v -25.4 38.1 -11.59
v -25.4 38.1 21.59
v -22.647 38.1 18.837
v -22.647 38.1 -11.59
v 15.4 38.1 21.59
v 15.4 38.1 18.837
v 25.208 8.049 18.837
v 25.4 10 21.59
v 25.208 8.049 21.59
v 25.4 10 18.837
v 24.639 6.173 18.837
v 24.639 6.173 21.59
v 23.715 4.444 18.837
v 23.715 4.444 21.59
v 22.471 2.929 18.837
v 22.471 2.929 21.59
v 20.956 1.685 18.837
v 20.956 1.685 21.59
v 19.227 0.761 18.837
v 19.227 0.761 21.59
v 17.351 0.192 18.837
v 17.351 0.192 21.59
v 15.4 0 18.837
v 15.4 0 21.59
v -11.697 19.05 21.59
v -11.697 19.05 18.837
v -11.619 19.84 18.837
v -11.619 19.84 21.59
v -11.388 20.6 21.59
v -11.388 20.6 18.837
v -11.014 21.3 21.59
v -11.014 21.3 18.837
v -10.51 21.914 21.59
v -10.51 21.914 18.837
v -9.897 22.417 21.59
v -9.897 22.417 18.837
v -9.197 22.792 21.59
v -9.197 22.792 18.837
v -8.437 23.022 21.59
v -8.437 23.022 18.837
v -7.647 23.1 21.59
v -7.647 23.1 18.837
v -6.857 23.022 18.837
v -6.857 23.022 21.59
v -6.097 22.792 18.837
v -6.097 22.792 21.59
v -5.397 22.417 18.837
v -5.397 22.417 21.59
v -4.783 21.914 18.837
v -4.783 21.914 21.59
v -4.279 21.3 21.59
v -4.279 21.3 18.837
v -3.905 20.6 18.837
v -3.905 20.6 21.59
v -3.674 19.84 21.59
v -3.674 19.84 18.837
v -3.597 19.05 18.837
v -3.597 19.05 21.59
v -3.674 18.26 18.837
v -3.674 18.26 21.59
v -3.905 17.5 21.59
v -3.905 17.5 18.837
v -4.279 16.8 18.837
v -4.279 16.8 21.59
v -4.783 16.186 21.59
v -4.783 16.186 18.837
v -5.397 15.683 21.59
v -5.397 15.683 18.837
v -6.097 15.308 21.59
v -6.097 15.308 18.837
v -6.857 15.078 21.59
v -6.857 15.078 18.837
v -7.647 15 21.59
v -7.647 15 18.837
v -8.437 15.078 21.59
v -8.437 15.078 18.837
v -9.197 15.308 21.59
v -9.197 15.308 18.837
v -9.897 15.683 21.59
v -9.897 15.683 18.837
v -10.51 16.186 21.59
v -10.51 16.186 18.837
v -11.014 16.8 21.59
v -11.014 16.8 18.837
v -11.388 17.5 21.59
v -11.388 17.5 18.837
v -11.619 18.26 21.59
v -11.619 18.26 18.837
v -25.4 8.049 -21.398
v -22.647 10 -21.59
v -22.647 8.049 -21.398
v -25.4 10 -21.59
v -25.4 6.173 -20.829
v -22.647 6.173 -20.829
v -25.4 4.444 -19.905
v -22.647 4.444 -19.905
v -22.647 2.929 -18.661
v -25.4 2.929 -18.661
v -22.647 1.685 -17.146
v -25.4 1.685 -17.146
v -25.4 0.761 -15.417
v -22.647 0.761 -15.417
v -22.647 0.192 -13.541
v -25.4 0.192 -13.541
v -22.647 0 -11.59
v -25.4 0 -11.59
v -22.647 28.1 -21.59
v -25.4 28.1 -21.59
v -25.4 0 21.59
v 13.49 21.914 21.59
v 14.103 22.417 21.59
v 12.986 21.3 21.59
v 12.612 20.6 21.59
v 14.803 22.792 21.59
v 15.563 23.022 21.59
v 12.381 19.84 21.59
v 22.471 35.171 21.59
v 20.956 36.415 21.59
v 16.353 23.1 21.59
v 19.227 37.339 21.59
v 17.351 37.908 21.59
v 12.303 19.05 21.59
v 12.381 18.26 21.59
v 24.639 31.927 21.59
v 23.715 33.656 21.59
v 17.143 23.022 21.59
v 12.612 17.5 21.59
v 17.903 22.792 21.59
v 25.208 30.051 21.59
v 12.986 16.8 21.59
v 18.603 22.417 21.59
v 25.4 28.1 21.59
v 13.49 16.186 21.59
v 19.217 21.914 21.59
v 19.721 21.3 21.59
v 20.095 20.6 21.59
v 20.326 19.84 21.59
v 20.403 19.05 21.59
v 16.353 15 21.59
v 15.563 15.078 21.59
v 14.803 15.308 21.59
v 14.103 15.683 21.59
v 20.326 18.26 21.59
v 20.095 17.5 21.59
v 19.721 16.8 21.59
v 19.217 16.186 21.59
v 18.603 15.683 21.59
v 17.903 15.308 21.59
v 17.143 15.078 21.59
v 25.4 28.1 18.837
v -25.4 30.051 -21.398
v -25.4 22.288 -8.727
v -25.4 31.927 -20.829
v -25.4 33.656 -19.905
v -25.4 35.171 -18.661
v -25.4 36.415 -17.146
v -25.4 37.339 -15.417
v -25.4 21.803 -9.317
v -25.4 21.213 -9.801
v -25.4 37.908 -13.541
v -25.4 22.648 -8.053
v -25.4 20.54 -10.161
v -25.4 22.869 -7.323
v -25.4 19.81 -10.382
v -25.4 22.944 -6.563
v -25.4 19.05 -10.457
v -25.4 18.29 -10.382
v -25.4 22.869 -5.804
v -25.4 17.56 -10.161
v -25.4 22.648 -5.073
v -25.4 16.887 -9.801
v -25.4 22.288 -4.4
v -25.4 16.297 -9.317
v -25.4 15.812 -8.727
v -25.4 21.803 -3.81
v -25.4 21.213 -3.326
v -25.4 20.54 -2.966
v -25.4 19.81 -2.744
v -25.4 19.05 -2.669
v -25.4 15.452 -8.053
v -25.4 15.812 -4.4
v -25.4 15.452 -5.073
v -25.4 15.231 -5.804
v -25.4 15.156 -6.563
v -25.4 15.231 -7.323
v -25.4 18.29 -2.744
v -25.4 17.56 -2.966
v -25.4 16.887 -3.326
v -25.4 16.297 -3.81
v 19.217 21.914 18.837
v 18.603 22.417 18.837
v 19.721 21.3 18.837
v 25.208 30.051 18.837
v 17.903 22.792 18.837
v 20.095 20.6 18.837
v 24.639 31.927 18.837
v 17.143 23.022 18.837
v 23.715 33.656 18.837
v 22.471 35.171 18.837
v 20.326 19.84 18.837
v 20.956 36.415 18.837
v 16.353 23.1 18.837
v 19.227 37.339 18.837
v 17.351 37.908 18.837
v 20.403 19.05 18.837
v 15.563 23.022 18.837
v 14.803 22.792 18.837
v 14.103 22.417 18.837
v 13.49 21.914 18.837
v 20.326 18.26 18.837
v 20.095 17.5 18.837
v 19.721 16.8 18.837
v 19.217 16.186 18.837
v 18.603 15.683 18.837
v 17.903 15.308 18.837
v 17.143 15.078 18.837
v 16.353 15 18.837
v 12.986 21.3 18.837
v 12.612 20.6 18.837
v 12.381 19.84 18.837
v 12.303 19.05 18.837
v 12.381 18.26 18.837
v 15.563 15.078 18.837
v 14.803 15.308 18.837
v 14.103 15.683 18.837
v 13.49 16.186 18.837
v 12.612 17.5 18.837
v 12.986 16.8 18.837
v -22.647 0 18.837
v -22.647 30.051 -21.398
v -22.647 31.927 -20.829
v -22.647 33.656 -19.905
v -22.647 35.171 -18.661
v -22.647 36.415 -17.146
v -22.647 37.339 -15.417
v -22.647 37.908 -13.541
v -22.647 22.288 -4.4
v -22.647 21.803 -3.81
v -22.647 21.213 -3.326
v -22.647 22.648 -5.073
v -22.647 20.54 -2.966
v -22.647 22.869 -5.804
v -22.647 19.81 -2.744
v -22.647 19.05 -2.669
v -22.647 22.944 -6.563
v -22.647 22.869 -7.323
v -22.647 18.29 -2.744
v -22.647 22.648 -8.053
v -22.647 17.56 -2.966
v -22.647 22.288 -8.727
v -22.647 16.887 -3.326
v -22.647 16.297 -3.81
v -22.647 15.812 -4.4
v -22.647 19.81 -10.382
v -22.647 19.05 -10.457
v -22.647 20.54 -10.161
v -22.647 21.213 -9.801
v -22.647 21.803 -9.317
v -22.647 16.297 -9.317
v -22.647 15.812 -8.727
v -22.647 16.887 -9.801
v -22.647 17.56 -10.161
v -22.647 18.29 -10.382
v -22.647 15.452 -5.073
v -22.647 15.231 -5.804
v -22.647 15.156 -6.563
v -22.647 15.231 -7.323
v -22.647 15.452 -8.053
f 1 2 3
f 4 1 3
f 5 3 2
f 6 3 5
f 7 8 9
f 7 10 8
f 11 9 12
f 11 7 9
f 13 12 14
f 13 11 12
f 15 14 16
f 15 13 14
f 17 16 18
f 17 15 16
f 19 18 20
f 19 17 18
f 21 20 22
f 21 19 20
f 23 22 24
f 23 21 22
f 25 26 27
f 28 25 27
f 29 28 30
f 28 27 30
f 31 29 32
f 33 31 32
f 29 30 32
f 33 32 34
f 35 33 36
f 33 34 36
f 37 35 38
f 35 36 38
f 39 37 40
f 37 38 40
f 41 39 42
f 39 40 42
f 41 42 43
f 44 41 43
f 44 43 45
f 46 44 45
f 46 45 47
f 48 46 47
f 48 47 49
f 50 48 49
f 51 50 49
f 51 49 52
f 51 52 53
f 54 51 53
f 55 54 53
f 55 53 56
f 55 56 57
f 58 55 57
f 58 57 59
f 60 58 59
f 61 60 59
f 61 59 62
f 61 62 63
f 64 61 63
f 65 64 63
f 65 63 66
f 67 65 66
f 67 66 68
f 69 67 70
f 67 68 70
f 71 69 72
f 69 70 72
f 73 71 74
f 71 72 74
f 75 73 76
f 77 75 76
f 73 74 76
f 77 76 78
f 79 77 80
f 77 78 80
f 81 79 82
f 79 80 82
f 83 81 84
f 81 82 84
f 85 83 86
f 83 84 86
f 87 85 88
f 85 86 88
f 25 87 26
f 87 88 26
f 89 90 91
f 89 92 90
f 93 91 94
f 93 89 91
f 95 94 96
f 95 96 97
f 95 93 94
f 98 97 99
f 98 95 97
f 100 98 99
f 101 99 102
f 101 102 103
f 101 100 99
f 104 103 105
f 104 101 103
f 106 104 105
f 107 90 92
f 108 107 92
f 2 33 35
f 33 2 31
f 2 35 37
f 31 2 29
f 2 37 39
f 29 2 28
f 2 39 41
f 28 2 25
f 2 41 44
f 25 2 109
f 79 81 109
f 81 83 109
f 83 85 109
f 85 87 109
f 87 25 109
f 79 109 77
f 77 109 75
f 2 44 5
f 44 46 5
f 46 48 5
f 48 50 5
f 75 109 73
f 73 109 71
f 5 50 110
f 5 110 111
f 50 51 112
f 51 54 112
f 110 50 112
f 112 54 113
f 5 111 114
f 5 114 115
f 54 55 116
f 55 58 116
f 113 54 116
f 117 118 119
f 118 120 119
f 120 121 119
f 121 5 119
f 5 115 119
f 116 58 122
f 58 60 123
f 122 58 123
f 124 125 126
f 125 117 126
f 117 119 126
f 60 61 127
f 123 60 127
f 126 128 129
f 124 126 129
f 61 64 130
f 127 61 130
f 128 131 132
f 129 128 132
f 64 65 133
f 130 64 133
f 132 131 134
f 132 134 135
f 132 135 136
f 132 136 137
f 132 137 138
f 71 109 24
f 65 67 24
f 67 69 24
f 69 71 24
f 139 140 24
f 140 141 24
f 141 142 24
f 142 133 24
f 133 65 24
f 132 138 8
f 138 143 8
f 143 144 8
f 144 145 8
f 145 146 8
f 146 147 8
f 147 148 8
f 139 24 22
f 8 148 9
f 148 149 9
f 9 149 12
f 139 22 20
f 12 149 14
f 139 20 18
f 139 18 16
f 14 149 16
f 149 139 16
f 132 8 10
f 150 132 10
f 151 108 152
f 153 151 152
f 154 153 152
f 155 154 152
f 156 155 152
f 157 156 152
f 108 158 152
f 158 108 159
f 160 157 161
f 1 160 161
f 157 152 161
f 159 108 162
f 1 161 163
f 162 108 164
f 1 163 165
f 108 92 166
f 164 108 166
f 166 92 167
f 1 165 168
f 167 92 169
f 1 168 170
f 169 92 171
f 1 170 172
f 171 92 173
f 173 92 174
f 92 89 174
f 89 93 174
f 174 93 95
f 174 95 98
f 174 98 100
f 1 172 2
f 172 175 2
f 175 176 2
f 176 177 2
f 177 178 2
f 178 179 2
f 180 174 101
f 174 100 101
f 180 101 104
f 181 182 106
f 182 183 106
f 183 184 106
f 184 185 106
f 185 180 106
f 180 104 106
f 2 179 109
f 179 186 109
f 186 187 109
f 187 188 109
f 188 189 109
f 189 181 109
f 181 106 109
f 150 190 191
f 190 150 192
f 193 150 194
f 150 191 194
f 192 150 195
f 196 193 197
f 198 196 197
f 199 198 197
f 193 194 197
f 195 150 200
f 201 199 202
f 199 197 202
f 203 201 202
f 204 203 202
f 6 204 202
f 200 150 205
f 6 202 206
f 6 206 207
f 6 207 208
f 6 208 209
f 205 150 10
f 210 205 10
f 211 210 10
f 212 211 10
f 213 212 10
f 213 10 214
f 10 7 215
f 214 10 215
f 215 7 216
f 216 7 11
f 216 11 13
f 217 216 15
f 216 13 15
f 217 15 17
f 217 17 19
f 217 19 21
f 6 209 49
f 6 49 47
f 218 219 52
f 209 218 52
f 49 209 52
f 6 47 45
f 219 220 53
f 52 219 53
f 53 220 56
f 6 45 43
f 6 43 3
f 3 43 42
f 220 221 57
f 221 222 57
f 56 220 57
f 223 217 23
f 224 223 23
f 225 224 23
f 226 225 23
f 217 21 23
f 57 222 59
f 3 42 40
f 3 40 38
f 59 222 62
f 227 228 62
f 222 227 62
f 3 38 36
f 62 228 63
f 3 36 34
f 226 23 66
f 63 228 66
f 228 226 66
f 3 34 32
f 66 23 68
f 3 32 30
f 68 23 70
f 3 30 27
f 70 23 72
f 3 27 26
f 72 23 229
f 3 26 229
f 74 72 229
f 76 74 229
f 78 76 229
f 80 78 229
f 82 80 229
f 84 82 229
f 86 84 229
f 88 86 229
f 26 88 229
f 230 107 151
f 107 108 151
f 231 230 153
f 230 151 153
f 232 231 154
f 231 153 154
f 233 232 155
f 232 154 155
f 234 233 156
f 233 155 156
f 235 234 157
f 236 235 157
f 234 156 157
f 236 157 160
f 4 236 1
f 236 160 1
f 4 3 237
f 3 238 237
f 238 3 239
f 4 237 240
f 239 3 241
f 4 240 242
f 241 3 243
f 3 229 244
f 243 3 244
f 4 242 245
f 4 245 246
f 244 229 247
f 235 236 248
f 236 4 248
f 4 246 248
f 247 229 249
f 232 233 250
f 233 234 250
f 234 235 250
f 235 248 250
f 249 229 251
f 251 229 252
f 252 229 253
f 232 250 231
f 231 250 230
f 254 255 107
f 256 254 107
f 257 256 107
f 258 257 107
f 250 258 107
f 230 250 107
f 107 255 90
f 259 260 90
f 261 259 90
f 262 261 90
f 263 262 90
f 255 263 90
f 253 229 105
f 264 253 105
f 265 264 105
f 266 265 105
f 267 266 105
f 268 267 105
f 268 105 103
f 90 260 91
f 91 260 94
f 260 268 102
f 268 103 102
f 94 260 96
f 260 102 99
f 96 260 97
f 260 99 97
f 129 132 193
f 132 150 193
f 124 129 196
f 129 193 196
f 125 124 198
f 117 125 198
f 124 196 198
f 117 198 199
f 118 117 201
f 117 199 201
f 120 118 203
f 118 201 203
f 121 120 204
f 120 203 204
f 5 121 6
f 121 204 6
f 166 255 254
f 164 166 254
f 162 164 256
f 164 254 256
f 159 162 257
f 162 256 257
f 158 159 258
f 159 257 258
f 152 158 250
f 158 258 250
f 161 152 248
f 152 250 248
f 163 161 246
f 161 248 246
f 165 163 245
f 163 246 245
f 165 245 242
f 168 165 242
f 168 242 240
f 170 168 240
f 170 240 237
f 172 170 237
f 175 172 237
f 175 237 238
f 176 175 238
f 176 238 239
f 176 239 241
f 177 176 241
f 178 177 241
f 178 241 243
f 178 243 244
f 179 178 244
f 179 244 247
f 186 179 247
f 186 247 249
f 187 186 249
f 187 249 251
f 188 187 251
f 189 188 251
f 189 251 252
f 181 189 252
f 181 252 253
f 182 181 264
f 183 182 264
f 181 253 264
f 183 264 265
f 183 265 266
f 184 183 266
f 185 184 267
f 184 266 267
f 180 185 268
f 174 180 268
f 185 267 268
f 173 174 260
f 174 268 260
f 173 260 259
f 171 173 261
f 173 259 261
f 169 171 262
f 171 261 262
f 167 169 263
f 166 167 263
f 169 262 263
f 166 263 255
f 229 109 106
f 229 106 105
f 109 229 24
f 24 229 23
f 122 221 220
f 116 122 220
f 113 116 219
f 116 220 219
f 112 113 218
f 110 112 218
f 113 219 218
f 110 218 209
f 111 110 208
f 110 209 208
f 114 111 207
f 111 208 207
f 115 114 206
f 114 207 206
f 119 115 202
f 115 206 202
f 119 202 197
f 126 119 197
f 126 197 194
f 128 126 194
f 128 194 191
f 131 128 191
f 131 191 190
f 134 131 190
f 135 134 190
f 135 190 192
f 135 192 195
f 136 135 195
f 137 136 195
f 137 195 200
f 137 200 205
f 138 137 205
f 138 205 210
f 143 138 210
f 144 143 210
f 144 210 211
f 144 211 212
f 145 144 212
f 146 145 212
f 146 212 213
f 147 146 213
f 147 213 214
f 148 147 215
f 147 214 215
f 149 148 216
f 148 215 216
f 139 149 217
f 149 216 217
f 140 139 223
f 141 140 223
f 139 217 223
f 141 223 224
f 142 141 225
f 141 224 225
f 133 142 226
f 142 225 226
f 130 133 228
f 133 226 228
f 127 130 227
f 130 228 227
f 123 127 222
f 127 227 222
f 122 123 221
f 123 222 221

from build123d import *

# Parameters (mm, degrees)
BOSS_EXTRUDE1_DEPTH = 38.1
FILLET1_R           = 10
SKETCH2_R           = 4.05
CUT_EXTRUDE1_DEPTH  = 3.75336
SKETCH3_R           = 3.893907584
CUT_EXTRUDE2_DEPTH  = 3.75336


with BuildPart() as part:
    # Sketch1 → Boss-Extrude1 (new body)
    with BuildSketch(Plane(origin=(0, 0, 0), x_dir=(1, 0, 0), z_dir=(0, 1, 0))):
        Polygon((-25.4, -21.59), (25.4, -21.59), (25.4, -18.83664), (-22.64664, -18.83664), (-22.64664, 21.59), (-25.4, 21.59), align=None)
    extrude(amount=BOSS_EXTRUDE1_DEPTH)

    # Fillet1
    fillet1_edges = [part.edges().sort_by_distance(p)[0] for p in [
        (25.4, 38.1, 20.21332),
        (-24.02332, 38.1, -21.59),
        (-24.02332, 0, -21.59),
        (25.4, 0, 20.21332),
    ]]
    fillet(fillet1_edges, radius=FILLET1_R)

    # Sketch2 → Cut-Extrude1 (cut, through all)
    with BuildSketch(Plane(origin=(0, 0, 18.83664), x_dir=(-1, 0, 0), z_dir=(0, 0, -1))):
        with Locations((-16.35336, 19.05)):
            Circle(SKETCH2_R)
        with Locations((7.64664, 19.05)):
            Circle(SKETCH2_R)
    extrude(amount=-CUT_EXTRUDE1_DEPTH, mode=Mode.SUBTRACT)

    # Sketch3 → Cut-Extrude2 (cut, through all)
    with BuildSketch(Plane(origin=(-22.64664, 0, 0), x_dir=(0, 0, -1), z_dir=(1, 0, 0))):
        with Locations((6.56336, 19.05)):
            Circle(SKETCH3_R)
    extrude(amount=-CUT_EXTRUDE2_DEPTH, mode=Mode.SUBTRACT)


solid = part.part
